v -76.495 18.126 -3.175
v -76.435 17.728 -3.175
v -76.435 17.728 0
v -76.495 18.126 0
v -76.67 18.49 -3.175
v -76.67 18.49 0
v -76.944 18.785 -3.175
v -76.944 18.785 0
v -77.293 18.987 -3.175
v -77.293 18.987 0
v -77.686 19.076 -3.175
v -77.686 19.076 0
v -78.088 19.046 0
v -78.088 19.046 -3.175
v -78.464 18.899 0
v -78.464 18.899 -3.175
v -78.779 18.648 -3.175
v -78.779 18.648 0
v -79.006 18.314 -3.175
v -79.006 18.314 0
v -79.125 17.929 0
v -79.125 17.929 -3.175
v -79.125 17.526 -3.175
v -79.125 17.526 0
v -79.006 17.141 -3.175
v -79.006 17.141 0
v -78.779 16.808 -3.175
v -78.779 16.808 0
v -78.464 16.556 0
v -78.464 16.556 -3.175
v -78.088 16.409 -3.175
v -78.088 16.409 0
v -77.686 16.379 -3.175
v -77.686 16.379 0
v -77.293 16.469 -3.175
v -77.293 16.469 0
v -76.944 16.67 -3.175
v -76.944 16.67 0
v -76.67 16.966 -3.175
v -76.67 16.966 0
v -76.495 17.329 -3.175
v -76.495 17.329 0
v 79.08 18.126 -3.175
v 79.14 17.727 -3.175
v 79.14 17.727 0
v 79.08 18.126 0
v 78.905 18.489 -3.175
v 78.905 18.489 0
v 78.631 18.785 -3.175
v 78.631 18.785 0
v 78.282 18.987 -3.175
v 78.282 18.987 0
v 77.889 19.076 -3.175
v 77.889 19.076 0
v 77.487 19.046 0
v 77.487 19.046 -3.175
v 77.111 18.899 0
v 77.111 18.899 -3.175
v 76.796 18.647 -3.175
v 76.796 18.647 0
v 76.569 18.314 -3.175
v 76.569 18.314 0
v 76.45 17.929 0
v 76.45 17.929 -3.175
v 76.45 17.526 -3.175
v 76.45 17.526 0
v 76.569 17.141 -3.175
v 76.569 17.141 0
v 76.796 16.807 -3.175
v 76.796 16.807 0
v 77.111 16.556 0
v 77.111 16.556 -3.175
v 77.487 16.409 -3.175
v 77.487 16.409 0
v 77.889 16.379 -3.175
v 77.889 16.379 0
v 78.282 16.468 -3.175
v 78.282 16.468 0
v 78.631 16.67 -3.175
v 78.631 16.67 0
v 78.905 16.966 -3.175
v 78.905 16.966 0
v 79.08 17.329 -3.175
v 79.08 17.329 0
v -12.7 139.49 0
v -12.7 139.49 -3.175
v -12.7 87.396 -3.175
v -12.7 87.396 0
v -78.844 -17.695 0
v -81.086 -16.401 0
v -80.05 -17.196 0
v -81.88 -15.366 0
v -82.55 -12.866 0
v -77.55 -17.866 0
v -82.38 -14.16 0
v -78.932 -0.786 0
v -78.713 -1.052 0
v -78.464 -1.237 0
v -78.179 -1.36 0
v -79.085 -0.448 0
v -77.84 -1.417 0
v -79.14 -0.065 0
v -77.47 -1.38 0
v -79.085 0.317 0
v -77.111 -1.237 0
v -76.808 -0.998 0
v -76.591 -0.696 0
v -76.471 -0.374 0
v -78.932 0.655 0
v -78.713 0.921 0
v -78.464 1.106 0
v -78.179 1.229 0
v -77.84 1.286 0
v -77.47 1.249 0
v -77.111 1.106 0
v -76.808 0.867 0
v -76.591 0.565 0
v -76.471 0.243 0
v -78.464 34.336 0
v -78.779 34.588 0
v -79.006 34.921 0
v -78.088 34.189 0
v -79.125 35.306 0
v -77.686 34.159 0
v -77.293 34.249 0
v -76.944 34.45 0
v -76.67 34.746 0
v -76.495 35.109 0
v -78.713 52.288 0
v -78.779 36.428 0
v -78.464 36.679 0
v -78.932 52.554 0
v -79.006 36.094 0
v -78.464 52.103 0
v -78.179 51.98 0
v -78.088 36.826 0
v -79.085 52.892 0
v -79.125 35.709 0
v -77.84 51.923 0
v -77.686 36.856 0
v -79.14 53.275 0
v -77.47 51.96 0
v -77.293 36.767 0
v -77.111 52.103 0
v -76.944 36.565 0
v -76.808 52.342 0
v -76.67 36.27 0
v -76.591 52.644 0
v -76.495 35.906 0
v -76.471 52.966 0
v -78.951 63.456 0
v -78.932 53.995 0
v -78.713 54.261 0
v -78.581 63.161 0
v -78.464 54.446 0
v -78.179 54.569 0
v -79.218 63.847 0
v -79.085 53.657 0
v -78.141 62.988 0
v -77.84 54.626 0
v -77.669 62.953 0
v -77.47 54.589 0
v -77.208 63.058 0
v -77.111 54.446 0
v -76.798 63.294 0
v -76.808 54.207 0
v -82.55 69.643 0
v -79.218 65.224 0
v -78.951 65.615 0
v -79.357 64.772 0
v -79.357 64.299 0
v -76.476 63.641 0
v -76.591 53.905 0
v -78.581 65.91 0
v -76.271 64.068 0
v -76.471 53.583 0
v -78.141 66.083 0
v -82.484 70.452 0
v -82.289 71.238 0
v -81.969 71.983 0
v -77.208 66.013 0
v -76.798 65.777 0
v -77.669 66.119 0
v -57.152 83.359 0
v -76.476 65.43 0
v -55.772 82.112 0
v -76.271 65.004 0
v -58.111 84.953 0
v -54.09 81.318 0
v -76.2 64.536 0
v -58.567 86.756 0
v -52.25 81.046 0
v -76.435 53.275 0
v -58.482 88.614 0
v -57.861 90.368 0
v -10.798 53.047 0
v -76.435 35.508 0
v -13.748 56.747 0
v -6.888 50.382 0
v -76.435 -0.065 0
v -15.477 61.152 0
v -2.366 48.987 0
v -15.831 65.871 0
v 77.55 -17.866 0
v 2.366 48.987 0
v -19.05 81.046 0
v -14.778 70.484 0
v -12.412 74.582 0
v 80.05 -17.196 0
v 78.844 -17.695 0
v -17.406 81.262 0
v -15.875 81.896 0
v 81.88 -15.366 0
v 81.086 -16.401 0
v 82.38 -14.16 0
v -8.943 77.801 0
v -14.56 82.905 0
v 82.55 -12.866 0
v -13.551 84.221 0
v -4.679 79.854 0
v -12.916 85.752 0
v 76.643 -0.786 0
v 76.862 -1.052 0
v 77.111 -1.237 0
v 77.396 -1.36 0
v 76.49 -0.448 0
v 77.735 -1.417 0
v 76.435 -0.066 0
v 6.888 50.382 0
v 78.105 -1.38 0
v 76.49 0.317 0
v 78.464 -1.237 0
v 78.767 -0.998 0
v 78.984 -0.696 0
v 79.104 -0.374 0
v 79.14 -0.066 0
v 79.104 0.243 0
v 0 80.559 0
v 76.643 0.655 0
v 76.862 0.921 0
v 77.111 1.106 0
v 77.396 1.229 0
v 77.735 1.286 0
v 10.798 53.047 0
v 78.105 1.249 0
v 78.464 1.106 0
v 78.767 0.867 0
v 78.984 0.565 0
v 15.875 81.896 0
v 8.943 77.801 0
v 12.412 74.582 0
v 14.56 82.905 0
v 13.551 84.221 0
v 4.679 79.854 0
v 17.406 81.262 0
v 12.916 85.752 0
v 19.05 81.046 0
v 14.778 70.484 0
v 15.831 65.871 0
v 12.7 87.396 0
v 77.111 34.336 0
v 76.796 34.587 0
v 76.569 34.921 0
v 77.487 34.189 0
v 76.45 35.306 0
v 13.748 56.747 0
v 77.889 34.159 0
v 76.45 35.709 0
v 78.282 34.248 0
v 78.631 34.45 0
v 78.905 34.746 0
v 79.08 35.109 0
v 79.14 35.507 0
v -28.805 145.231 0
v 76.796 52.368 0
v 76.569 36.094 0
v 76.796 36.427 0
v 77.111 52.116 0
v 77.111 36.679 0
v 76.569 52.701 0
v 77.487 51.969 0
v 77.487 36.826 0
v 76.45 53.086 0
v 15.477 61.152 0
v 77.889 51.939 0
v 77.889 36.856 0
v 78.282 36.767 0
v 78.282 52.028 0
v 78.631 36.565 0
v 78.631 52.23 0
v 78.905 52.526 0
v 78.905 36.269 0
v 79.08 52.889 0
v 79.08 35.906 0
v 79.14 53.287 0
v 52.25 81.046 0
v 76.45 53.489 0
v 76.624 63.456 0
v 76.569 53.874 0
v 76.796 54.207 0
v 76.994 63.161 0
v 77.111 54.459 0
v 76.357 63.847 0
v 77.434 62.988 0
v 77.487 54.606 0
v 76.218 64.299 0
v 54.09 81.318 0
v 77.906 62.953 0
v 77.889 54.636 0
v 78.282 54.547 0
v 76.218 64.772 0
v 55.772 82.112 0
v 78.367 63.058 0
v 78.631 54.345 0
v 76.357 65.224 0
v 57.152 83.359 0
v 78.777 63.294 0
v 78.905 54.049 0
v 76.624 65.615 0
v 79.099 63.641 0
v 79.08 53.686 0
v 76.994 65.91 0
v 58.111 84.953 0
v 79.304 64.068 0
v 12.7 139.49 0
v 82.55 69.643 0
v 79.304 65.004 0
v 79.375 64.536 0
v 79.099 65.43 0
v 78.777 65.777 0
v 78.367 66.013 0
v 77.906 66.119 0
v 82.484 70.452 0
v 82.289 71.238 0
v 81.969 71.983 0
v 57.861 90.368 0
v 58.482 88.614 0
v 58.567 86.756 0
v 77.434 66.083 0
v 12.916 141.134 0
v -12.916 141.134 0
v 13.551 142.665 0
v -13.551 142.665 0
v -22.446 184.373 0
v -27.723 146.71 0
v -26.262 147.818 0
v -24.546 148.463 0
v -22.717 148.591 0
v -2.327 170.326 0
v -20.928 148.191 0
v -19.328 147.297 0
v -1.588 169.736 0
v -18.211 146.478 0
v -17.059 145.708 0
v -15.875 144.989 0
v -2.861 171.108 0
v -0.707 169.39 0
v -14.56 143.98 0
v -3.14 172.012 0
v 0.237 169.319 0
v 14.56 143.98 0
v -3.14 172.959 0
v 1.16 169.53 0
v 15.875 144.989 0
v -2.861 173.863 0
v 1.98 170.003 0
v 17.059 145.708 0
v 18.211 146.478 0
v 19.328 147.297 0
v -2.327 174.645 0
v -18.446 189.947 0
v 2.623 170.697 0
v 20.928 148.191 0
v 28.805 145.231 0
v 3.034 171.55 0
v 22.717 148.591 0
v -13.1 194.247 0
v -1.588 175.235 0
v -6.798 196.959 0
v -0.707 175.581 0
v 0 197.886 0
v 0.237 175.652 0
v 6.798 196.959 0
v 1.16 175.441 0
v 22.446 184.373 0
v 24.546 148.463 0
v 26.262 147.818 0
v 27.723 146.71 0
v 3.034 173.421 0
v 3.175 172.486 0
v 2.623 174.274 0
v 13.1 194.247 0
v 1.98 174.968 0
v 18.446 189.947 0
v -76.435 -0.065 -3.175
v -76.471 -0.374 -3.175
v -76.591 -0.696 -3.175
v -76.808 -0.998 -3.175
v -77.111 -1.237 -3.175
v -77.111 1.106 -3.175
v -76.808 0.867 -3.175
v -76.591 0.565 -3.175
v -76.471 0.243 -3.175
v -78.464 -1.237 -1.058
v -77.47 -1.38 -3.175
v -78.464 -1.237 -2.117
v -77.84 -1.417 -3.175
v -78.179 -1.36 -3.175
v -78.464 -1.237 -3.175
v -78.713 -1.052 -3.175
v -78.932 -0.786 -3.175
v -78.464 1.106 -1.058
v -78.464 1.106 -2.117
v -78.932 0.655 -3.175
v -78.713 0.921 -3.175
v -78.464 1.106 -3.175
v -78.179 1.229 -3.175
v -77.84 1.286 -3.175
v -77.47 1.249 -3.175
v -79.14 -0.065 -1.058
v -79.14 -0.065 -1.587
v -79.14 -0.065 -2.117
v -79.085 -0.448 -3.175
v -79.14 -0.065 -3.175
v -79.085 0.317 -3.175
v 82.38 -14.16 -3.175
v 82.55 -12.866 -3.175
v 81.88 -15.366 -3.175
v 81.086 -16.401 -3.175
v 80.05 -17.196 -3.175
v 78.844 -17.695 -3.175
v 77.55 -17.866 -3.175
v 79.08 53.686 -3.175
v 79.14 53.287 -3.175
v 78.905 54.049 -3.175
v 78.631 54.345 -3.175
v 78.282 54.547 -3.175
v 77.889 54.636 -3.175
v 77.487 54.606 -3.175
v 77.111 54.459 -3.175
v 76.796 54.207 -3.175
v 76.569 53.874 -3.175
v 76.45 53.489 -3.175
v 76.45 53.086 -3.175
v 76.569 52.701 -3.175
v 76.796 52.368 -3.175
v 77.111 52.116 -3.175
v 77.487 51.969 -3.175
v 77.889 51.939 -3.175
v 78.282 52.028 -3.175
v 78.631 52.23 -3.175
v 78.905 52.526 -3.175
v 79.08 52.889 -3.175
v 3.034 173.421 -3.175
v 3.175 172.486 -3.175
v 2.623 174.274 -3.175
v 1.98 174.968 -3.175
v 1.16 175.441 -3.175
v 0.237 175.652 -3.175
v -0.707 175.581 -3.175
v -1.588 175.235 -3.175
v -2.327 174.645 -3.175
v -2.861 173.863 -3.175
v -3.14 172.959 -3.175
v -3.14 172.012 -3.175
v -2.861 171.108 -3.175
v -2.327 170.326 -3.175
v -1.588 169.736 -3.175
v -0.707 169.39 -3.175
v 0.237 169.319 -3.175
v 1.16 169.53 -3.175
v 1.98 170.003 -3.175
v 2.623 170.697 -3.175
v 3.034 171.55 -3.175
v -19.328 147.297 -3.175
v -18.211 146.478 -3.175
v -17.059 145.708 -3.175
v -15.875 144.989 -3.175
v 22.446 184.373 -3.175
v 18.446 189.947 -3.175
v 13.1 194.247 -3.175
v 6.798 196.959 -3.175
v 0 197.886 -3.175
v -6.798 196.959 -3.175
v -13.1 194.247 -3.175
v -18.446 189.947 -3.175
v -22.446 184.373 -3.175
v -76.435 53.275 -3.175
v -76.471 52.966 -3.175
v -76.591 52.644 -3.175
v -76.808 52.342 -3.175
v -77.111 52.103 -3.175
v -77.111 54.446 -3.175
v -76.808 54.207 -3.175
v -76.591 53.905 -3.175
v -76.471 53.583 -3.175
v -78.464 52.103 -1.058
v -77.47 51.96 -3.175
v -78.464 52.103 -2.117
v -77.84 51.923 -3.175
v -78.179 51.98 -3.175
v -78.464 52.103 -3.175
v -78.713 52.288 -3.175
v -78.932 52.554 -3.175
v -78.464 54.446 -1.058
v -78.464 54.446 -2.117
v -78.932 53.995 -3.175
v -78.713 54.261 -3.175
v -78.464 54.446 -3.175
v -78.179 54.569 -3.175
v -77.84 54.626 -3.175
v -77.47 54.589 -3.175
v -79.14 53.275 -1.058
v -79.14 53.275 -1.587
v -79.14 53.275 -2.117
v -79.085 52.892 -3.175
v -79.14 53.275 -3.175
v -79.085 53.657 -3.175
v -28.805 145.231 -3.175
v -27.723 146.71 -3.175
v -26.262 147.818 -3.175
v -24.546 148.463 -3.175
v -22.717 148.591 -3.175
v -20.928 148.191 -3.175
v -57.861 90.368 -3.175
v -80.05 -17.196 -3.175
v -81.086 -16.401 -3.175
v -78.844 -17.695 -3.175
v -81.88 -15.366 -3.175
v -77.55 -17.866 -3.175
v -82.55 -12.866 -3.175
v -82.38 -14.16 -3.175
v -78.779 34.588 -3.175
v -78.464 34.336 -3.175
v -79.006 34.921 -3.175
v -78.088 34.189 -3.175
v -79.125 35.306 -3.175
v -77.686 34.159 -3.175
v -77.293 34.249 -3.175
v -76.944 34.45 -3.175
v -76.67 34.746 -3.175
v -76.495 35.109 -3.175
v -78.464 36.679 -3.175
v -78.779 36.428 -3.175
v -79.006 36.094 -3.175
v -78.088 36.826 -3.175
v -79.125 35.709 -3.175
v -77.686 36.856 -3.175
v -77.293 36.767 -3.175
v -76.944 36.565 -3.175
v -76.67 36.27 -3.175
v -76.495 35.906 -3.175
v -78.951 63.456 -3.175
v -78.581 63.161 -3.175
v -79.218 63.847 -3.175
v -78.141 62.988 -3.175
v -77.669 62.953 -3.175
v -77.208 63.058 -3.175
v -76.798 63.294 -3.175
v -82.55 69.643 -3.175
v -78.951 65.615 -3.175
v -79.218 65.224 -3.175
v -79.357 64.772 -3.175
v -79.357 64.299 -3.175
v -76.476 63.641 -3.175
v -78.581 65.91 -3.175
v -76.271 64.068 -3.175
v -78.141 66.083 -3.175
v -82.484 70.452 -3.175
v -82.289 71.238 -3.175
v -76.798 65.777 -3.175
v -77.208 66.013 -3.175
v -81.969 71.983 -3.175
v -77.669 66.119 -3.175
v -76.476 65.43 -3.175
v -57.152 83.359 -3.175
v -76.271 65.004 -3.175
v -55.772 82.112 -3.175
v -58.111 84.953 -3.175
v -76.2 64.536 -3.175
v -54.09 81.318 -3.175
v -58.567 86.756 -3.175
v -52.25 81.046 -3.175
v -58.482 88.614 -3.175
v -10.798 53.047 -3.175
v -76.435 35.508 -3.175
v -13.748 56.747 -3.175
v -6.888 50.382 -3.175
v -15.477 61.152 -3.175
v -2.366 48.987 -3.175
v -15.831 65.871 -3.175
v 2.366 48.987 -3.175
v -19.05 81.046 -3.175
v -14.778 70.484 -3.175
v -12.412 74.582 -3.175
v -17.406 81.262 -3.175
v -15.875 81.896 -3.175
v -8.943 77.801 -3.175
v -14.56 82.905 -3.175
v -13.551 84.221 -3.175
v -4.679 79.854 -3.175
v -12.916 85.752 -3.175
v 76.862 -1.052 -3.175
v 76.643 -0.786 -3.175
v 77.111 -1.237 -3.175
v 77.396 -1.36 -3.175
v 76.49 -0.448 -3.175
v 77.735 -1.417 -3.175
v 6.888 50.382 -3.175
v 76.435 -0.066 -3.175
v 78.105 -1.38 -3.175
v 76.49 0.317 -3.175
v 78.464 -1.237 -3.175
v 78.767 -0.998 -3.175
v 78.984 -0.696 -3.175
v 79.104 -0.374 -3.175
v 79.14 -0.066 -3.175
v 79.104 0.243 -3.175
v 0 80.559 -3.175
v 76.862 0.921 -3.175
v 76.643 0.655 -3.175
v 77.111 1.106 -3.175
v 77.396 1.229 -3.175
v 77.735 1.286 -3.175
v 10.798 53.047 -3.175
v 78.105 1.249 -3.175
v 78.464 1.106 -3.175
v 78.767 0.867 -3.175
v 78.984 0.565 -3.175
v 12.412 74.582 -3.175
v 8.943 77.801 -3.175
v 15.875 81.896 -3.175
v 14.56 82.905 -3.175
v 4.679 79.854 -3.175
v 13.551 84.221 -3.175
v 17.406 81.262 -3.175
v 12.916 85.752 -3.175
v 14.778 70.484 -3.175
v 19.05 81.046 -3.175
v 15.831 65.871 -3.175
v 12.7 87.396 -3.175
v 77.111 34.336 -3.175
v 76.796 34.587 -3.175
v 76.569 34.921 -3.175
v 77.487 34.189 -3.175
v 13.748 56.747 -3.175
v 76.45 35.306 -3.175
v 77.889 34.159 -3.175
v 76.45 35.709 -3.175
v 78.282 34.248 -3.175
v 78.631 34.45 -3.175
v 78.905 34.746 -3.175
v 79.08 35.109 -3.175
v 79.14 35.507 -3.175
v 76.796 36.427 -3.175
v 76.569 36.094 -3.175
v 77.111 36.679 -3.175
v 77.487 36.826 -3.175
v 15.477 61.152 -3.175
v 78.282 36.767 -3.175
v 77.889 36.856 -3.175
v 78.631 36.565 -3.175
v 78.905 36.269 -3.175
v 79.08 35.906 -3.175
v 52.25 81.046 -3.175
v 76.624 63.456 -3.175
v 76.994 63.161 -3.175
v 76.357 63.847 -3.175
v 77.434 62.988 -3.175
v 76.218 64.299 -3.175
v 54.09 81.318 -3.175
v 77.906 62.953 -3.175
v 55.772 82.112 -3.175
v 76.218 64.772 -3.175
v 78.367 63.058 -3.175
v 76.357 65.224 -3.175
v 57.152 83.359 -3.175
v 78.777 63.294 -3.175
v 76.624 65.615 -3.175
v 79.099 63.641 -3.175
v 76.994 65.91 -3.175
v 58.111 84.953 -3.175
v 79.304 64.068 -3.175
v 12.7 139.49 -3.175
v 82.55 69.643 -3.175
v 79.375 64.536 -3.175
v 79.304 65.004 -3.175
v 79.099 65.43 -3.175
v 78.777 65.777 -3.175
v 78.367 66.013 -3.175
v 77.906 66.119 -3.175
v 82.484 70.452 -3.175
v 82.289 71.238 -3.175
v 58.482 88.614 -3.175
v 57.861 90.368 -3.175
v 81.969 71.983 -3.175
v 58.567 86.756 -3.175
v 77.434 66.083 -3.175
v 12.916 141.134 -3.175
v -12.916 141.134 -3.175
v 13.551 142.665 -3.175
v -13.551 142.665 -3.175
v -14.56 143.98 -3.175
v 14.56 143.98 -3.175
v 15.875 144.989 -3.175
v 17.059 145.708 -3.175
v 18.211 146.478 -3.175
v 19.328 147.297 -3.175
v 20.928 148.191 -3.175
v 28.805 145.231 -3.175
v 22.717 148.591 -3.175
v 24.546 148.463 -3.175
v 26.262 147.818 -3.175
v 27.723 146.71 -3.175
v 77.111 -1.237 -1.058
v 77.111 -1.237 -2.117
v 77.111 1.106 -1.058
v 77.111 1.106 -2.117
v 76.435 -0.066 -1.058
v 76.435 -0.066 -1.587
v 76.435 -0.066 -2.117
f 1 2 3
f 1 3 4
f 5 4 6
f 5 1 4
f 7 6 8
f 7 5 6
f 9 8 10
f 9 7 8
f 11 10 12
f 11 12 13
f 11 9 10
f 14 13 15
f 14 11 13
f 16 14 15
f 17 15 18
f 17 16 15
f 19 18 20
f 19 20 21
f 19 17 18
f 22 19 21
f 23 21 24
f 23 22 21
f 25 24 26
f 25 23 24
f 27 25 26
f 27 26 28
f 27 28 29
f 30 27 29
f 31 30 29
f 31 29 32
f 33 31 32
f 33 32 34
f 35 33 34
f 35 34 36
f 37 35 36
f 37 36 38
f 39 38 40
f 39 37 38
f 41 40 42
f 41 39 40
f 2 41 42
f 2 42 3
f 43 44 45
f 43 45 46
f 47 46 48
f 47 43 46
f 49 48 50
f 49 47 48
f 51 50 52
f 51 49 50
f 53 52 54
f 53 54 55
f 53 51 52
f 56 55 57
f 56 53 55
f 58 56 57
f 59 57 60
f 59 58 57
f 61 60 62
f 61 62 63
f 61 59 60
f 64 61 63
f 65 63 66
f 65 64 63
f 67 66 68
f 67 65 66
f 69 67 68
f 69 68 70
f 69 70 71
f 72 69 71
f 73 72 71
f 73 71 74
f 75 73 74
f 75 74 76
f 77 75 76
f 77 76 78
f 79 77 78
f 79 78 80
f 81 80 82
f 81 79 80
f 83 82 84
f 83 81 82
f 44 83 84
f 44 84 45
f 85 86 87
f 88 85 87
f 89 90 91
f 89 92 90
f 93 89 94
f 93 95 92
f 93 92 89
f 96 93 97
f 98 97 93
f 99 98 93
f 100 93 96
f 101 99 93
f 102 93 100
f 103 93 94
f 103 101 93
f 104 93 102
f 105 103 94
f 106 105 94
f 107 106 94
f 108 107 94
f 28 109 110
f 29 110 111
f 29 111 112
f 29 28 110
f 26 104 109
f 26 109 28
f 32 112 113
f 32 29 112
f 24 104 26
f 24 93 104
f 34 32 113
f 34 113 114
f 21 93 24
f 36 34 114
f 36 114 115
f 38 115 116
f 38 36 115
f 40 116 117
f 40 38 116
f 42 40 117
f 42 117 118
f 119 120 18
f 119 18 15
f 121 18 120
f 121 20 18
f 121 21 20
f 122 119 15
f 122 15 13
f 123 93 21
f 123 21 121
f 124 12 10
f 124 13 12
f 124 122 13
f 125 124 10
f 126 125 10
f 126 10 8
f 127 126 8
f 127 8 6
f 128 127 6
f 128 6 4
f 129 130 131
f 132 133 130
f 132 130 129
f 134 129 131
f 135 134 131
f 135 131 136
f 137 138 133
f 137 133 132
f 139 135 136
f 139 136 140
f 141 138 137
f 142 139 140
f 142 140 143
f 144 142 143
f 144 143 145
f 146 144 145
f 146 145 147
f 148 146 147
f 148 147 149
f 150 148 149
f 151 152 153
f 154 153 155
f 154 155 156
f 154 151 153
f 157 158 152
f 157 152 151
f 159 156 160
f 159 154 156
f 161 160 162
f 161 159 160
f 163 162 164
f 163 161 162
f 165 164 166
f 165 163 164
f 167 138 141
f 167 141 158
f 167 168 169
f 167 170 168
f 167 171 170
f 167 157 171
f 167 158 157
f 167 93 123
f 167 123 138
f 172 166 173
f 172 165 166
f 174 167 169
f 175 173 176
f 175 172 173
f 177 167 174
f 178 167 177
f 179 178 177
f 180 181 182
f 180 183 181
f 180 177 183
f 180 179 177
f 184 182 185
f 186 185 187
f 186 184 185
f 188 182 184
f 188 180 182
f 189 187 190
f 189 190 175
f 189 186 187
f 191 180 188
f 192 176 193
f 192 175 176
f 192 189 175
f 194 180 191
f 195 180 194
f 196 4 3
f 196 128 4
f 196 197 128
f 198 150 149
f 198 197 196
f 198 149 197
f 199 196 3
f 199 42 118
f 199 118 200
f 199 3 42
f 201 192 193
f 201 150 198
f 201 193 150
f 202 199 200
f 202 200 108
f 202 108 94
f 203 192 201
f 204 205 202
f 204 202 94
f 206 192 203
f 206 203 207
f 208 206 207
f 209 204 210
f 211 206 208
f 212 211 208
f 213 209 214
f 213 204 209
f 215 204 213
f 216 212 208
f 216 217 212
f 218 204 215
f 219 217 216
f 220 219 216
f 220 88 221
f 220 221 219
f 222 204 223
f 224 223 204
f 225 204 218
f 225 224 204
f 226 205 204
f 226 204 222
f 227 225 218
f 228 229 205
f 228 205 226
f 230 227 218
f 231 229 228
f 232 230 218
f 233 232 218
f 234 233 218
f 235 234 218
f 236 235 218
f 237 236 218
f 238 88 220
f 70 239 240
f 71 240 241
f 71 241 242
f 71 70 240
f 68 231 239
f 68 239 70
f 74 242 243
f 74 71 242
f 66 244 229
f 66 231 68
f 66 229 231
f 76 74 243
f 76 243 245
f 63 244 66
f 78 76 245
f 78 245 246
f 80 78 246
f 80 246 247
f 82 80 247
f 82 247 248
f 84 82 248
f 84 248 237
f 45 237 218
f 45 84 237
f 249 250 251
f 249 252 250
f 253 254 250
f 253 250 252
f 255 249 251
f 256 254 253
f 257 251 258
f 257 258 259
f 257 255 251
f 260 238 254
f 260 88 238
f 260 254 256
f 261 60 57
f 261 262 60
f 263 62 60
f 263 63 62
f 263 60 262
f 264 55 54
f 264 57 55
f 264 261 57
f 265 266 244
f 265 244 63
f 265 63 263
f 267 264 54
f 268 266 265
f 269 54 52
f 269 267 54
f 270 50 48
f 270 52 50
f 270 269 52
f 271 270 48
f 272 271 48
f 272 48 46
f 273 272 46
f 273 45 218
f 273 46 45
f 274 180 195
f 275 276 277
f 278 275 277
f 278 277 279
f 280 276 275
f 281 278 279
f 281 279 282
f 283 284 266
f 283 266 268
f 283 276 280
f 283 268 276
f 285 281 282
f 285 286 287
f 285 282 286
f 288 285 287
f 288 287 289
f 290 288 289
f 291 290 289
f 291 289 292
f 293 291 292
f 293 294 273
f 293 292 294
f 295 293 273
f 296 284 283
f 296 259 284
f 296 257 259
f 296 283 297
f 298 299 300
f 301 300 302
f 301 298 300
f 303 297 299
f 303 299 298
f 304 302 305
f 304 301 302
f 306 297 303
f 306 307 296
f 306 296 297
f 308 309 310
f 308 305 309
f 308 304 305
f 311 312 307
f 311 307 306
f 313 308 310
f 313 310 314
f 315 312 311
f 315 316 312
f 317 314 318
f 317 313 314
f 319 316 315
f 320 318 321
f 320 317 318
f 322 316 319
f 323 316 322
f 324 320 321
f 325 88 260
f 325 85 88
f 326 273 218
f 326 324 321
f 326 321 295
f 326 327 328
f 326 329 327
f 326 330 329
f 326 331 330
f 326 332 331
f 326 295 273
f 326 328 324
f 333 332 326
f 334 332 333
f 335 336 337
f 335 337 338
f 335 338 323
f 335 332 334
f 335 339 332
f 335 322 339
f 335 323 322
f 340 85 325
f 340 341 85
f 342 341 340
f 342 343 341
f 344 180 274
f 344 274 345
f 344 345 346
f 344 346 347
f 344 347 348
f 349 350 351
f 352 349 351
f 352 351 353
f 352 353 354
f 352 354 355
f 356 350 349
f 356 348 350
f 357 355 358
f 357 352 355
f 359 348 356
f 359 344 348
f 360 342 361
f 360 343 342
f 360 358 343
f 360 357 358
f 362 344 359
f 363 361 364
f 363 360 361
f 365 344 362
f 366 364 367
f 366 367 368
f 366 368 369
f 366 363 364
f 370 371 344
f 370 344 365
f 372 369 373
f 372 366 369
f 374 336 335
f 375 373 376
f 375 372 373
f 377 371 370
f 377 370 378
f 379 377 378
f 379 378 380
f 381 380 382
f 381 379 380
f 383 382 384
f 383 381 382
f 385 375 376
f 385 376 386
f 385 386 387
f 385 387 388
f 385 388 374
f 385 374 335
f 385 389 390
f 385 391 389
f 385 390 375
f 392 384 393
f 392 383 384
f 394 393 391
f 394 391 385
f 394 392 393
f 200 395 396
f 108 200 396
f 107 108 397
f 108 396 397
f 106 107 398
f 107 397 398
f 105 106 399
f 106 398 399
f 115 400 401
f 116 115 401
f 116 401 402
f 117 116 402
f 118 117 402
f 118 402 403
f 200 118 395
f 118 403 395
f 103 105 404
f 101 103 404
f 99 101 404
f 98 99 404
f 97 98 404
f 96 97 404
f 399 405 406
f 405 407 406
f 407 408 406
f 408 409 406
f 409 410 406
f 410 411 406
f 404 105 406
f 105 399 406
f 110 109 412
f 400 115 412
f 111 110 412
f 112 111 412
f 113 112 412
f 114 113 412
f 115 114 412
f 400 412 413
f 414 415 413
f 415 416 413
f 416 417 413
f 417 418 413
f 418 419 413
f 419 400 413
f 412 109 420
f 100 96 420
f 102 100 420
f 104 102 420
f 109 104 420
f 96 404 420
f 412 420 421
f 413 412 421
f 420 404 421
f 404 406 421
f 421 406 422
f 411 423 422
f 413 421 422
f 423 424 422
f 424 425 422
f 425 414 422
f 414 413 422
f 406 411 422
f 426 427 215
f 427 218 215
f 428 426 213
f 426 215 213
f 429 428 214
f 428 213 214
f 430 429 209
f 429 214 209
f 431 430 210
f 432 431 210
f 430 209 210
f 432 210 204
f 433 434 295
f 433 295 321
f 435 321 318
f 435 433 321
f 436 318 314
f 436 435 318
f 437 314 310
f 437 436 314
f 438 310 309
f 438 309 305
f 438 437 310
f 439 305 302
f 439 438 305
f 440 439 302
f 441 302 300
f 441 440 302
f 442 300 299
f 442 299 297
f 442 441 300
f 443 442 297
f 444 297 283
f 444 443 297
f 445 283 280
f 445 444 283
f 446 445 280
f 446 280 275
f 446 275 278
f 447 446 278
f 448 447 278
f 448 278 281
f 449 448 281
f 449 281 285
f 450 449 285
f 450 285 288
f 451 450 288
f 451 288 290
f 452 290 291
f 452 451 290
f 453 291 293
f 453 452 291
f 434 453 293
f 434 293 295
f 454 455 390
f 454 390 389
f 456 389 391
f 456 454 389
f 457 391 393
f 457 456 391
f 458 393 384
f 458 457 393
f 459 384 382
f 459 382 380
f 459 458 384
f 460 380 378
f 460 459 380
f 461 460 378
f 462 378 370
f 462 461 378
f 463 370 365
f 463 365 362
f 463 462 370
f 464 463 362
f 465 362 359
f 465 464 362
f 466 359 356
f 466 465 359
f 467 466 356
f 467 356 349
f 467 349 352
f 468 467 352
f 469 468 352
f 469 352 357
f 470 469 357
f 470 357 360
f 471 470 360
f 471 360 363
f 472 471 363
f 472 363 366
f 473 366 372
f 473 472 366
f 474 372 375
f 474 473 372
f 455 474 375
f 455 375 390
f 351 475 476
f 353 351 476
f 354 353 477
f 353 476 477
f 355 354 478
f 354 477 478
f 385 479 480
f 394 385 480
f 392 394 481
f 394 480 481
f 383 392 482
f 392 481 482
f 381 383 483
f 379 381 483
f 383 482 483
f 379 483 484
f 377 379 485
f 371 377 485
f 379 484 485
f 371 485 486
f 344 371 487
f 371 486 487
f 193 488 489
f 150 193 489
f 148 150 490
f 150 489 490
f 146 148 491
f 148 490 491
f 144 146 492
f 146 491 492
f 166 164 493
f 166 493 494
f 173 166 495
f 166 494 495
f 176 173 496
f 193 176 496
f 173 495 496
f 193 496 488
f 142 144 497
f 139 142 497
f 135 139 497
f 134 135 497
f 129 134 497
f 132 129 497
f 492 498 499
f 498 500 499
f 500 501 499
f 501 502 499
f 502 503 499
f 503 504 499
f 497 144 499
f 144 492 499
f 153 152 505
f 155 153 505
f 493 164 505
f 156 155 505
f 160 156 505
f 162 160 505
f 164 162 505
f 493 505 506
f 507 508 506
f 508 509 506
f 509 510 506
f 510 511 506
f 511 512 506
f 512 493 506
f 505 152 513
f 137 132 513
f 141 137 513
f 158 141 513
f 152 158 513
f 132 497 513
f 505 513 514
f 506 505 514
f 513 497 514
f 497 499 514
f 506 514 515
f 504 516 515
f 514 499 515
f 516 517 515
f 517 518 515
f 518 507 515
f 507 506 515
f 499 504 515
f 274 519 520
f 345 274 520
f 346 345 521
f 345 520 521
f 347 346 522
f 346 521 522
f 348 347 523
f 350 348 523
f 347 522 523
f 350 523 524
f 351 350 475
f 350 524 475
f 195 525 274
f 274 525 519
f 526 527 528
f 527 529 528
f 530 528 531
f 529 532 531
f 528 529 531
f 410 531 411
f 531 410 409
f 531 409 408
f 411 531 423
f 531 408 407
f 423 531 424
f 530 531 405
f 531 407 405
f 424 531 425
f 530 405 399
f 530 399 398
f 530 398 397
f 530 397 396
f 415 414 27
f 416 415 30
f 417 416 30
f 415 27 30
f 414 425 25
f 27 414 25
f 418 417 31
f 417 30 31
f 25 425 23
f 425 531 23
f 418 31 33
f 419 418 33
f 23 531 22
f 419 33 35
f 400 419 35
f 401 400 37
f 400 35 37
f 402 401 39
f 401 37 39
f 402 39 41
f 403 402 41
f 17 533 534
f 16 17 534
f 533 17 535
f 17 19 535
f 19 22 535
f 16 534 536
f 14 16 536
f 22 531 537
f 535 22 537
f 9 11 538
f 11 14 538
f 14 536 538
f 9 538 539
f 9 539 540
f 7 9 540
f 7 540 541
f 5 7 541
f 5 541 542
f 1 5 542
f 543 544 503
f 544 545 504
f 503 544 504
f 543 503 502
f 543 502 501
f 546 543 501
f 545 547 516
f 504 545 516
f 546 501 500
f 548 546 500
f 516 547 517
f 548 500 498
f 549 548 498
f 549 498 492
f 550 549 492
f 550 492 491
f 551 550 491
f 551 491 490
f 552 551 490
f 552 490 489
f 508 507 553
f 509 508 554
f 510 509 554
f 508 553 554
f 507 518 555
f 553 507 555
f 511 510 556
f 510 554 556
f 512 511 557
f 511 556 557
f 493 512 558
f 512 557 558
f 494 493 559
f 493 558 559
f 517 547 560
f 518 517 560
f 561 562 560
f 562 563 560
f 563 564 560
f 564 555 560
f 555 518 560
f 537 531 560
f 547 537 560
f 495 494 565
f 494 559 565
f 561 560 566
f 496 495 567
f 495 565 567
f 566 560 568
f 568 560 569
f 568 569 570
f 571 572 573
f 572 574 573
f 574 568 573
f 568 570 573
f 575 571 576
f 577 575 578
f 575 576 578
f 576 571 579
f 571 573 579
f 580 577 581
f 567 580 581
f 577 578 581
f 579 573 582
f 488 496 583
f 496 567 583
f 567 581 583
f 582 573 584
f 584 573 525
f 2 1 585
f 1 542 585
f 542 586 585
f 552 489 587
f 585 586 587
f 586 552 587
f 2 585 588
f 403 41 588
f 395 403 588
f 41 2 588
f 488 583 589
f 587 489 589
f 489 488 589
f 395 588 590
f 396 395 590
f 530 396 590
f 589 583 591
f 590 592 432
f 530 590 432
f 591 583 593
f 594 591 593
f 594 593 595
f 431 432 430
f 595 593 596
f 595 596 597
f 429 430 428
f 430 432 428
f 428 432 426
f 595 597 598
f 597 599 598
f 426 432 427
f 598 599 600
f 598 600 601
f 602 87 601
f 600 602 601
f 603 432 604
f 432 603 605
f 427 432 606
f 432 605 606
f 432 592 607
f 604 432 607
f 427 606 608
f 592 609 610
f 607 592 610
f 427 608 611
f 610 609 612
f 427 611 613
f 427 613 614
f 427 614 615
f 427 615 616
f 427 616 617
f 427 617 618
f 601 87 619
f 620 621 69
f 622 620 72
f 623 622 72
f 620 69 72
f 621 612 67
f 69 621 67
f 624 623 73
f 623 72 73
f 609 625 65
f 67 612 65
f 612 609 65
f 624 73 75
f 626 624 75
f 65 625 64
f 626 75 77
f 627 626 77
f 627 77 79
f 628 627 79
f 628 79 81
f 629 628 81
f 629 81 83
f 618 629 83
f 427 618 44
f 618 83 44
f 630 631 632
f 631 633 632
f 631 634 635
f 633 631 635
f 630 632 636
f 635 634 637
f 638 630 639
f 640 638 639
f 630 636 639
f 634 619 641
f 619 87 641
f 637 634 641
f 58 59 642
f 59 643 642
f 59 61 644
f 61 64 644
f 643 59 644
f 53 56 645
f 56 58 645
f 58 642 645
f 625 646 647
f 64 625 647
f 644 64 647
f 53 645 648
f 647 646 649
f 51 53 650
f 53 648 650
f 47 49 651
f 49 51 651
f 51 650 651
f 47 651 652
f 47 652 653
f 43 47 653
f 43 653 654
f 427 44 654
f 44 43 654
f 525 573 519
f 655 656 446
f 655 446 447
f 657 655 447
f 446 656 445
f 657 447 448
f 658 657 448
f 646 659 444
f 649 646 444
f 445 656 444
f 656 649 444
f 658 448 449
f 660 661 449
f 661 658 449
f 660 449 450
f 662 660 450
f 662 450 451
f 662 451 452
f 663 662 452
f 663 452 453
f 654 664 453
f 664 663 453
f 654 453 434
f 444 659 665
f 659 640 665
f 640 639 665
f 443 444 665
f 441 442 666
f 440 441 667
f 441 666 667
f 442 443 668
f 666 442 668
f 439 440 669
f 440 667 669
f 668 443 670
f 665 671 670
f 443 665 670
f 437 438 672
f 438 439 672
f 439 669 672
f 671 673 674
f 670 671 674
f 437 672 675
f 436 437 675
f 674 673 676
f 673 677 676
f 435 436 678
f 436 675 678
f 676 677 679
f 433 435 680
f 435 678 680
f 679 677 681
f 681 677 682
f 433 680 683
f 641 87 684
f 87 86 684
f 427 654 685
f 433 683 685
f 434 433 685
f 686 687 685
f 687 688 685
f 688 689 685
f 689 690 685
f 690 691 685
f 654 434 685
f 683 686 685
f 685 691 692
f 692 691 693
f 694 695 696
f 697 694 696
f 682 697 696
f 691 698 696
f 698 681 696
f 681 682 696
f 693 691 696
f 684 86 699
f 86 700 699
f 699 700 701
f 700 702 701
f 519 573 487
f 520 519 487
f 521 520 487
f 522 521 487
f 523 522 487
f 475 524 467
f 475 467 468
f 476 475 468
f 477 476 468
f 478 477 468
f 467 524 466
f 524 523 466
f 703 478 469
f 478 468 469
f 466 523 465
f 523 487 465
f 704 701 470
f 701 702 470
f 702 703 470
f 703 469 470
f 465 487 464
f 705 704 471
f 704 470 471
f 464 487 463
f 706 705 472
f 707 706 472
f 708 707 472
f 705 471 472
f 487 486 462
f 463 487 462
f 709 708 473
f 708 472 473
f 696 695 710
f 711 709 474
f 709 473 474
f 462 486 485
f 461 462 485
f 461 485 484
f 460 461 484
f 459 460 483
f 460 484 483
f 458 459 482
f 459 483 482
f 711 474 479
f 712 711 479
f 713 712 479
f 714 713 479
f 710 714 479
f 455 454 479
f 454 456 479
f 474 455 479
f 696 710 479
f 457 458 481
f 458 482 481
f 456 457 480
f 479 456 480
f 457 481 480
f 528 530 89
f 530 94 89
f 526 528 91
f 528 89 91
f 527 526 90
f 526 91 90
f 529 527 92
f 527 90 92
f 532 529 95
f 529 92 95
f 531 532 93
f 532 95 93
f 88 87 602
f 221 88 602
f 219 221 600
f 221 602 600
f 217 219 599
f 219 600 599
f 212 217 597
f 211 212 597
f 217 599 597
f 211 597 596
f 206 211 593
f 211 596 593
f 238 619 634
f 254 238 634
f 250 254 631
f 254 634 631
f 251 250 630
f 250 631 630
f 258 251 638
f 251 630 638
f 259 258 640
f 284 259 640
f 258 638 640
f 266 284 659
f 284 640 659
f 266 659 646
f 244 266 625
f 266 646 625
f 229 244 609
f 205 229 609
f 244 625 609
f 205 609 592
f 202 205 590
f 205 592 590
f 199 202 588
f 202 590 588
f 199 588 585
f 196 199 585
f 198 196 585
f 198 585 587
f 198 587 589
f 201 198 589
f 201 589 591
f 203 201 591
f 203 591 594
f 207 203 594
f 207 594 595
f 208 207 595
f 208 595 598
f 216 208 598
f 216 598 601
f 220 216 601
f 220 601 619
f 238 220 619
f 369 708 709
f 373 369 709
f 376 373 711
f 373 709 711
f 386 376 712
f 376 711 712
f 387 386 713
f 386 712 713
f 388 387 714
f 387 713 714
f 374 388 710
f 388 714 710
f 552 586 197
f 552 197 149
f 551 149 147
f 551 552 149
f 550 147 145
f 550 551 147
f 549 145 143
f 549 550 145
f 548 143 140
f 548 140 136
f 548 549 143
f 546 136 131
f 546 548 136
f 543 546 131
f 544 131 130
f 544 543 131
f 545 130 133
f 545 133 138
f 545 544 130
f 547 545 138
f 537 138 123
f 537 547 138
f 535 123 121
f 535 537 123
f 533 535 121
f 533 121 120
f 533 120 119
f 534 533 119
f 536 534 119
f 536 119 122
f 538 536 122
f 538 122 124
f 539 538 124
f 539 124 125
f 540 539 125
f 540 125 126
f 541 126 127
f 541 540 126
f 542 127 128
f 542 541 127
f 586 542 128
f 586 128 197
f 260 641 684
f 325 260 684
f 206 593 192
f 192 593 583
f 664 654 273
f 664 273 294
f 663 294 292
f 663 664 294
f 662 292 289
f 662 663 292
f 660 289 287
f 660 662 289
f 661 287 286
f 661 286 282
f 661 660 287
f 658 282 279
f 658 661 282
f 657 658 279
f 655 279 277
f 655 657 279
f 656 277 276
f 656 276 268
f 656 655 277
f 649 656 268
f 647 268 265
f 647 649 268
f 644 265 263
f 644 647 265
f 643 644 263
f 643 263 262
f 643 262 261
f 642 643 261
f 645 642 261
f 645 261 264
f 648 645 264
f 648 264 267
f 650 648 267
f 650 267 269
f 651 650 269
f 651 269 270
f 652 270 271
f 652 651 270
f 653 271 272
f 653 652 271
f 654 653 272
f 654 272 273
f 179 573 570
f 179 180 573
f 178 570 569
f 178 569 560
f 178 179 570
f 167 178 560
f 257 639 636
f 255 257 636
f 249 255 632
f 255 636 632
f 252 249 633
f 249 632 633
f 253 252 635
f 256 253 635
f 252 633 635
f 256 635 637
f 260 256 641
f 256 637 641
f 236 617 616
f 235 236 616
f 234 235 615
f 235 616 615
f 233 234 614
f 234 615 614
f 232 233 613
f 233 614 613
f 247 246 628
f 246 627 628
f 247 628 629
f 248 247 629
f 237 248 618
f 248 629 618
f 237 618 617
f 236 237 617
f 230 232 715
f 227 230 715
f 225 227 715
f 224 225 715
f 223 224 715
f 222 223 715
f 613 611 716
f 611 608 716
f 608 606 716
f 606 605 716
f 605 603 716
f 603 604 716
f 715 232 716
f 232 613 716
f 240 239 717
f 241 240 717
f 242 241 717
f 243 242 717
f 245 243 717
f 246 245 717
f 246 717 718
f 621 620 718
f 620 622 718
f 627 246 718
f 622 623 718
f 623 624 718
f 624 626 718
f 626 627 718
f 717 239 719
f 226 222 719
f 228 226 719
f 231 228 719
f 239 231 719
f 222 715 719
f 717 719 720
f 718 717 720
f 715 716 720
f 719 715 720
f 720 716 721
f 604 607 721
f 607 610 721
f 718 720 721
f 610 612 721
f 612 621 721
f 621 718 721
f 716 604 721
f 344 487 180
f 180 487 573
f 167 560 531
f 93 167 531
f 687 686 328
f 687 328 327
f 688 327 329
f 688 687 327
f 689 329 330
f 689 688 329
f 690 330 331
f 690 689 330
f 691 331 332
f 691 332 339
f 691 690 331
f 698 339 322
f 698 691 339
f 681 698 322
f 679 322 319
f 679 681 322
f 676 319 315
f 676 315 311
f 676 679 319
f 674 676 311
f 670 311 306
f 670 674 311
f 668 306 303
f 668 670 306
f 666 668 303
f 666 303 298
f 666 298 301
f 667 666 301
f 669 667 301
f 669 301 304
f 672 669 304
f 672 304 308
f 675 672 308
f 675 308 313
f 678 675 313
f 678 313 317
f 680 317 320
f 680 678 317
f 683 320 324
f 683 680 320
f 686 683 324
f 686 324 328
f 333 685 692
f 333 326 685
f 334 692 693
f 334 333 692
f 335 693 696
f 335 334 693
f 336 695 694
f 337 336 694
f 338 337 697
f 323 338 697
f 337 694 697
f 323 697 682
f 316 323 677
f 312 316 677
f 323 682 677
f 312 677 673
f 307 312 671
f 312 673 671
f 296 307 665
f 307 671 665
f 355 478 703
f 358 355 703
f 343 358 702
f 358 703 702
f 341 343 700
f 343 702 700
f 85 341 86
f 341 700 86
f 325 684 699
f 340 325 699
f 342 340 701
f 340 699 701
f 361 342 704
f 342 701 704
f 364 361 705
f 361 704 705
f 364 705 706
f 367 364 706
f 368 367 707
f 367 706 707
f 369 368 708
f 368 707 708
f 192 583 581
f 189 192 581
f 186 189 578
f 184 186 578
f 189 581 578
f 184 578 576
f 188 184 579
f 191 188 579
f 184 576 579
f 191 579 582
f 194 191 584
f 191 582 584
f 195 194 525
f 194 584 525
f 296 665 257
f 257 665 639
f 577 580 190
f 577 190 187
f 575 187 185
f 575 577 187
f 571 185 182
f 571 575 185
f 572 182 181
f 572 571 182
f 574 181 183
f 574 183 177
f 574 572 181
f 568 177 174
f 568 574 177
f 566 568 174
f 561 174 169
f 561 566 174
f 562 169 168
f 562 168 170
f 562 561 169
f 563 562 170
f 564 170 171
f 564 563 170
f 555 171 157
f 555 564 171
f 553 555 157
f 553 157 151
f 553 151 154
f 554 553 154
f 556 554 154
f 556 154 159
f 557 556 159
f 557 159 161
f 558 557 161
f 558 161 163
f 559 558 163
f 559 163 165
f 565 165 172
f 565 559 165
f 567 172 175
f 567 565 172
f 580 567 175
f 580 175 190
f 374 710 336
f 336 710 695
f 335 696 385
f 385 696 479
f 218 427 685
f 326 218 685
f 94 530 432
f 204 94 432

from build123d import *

# Parameters (mm, degrees)
AM_1014_TI_PLATE_BOTTOM_1_AM_0001_ARTEME_START = -3.175
AM_1014_TI_PLATE_BOTTOM_1_AM_0001_AR_2_R       = 1.352550752
AM_1014_TI_PLATE_BOTTOM_1_AM_0001_AR_2_R_2     = 1.5875
AM_1014_TI_PLATE_BOTTOM_1_AM_0001_AR_2_R_3     = 3.175
AM_1014_TI_PLATE_BOTTOM_1_AM_0001_ARTEME_DEPTH = 3.175
BOSS_EXTRUDE1_DEPTH                            = 3.175
FILLET1_R                                      = 5
FILLET2_R                                      = 5
SKETCH3_R                                      = 15.875
CUT_EXTRUDE1_DEPTH                             = 215.437164916


# Read off the part's stored shape, not the designer's step: AM_1014_TI_PLATE_BOTTOM<1>@AM_0001_ARTEMECH
with BuildPart() as part:
    # AM_1014_TI_PLATE_BOTTOM_1_AM_0001_AR 2 → AM_1014_TI_PLATE_BOTTOM<1>@AM_0001_ARTEMECH (new body)
    with BuildSketch(Plane.XY.offset(AM_1014_TI_PLATE_BOTTOM_1_AM_0001_ARTEME_START)):
        with BuildLine():
            Line((82.55, -17.865698052), (82.55, 70.885609673))
            Line((82.55, 70.885609673), (22.446426721, 184.373331383))
            ThreePointArc((22.446426721, 184.373331383), (0, 197.885609673), (-22.446426721, 184.373331383))
            Line((-22.446426721, 184.373331383), (-82.55, 70.885609673))
            Line((-82.55, 70.885609673), (-82.55, -17.865526365))
            Line((-82.55, -17.865526365), (82.55, -17.865698052))
        make_face()
        with BuildLine():
            add(Edge.make_bspline(
                [(-76.43495, -0.065424583), (-76.43495, -2.408108601), (-78.463775, -1.236766592), (-80.4926, -0.065424583), (-78.463775, 1.105917426), (-76.43495, 2.277259435), (-76.43495, -0.065424583)],
                knots=[0, 0, 0, 2.094395102, 2.094395102, 4.188790205, 4.188790205, 6.283185307, 6.283185307, 6.283185307], degree=2, weights=[1, 0.5, 1, 0.5, 1, 0.5, 1]))
        make_face(mode=Mode.SUBTRACT)
        with Locations((-77.7875, 17.727628115)):
            Circle(AM_1014_TI_PLATE_BOTTOM_1_AM_0001_AR_2_R, mode=Mode.SUBTRACT)
        with Locations((-77.7875, 35.507637995)):
            Circle(AM_1014_TI_PLATE_BOTTOM_1_AM_0001_AR_2_R, mode=Mode.SUBTRACT)
        with BuildLine():
            add(Edge.make_bspline(
                [(-76.43495, 53.274545779), (-76.43495, 50.931861761), (-78.463775, 52.10320377), (-80.4926, 53.274545779), (-78.463775, 54.445887788), (-76.43495, 55.617229797), (-76.43495, 53.274545779)],
                knots=[0, 0, 0, 2.094395102, 2.094395102, 4.188790205, 4.188790205, 6.283185307, 6.283185307, 6.283185307], degree=2, weights=[1, 0.5, 1, 0.5, 1, 0.5, 1]))
        make_face(mode=Mode.SUBTRACT)
        with Locations((-77.7875, 64.535609673)):
            Circle(AM_1014_TI_PLATE_BOTTOM_1_AM_0001_AR_2_R_2, mode=Mode.SUBTRACT)
        with BuildLine():
            Line((-25.498963051, 42.455971326), (-25.498963051, 51.980966033))
            add(Edge.make_bspline(
                [(-27.992064204, 57.025448466), (-25.498963051, 55.119281003), (-25.498963051, 51.980966033)],
                knots=[5.365154464, 5.365154464, 5.365154464, 6.283185307, 6.283185307, 6.283185307], degree=2, weights=[1, 0.896489165, 1]))
            ThreePointArc((-27.992064204, 57.025448466), (-26.013795844, 54.758623994), (-25.301036949, 51.835609673))
            Line((-25.301036949, 51.835609673), (-25.301036949, 42.310609673))
            ThreePointArc((-25.301036949, 42.310609673), (-24.985888452, 40.931525054), (-24.103005841, 39.826214575))
            add(Edge.make_bspline(
                [(-25.498963051, 42.455971326), (-25.49896305, 40.770584495), (-24.103005841, 39.826214575)],
                knots=[0, 0, 0, 0.976013915, 0.976013915, 0.976013915], degree=2, weights=[1, 0.883269083, 1]))
        make_face(mode=Mode.SUBTRACT)
        with Locations((-21.166666667, 47.762966307)):
            Circle(AM_1014_TI_PLATE_BOTTOM_1_AM_0001_AR_2_R_2, mode=Mode.SUBTRACT)
        with BuildLine():
            ThreePointArc((-11.2, 77.174125728), (-9.5, 78.874125728), (-7.8, 77.174125728))
            Line((-7.8, 77.174125728), (-7.8, 64.474125728))
            ThreePointArc((-7.8, 64.474125728), (-9.5, 62.774125728), (-11.2, 64.474125728))
            Line((-11.2, 64.474125728), (-11.2, 77.174125728))
        make_face(mode=Mode.SUBTRACT)
        with BuildLine():
            ThreePointArc((-1.7, 85.174125728), (0, 86.874125728), (1.7, 85.174125728))
            Line((1.7, 85.174125728), (1.7, 56.474125728))
            ThreePointArc((1.7, 56.474125728), (0, 54.774125728), (-1.7, 56.474125728))
            Line((-1.7, 56.474125728), (-1.7, 85.174125728))
        make_face(mode=Mode.SUBTRACT)
        with BuildLine():
            add(Edge.make_bspline(
                [(79.14005, -0.065596271), (79.14005, -2.408280289), (77.111225, -1.23693828), (75.0824, -0.065596271), (77.111225, 1.105745738), (79.14005, 2.277087747), (79.14005, -0.065596271)],
                knots=[0, 0, 0, 2.094395102, 2.094395102, 4.188790205, 4.188790205, 6.283185307, 6.283185307, 6.283185307], degree=2, weights=[1, 0.5, 1, 0.5, 1, 0.5, 1]))
        make_face(mode=Mode.SUBTRACT)
        with Locations((77.7875, 17.727456427)):
            Circle(AM_1014_TI_PLATE_BOTTOM_1_AM_0001_AR_2_R, mode=Mode.SUBTRACT)
        with Locations((77.7875, 35.507466307)):
            Circle(AM_1014_TI_PLATE_BOTTOM_1_AM_0001_AR_2_R, mode=Mode.SUBTRACT)
        with Locations((21.166666667, 47.762966307)):
            Circle(AM_1014_TI_PLATE_BOTTOM_1_AM_0001_AR_2_R_2, mode=Mode.SUBTRACT)
        with BuildLine():
            ThreePointArc((7.8, 77.174125728), (9.5, 78.874125728), (11.2, 77.174125728))
            Line((11.2, 77.174125728), (11.2, 64.474125728))
            ThreePointArc((11.2, 64.474125728), (9.5, 62.774125728), (7.8, 64.474125728))
            Line((7.8, 64.474125728), (7.8, 77.174125728))
        make_face(mode=Mode.SUBTRACT)
        with Locations((77.7875, 53.287476186)):
            Circle(AM_1014_TI_PLATE_BOTTOM_1_AM_0001_AR_2_R, mode=Mode.SUBTRACT)
        with Locations((77.7875, 64.535609673)):
            Circle(AM_1014_TI_PLATE_BOTTOM_1_AM_0001_AR_2_R_2, mode=Mode.SUBTRACT)
        with BuildLine():
            ThreePointArc((-28.80539088, 145.230757697), (-24.546211379, 148.463135508), (-19.3281535, 147.296624336))
            ThreePointArc((-19.3281535, 147.296624336), (-17.639343437, 146.086441824), (-15.875, 144.989303103))
            ThreePointArc((-15.875, 144.989303103), (-13.550738686, 142.665041789), (-12.7, 139.490041789))
            Line((-12.7, 139.490041789), (-12.7, 87.395609673))
            ThreePointArc((-12.7, 87.395609673), (-14.559871939, 82.905481612), (-19.05, 81.045609673))
            Line((-19.05, 81.045609673), (-52.249574284, 81.045609673))
            ThreePointArc((-52.249574284, 81.045609673), (-57.689898641, 84.120648468), (-57.861180964, 90.3675401))
            Line((-57.861180964, 90.3675401), (-28.80539088, 145.230757697))
        make_face(mode=Mode.SUBTRACT)
        with Locations((0, 172.485609673)):
            Circle(AM_1014_TI_PLATE_BOTTOM_1_AM_0001_AR_2_R_3, mode=Mode.SUBTRACT)
        with BuildLine():
            ThreePointArc((12.7, 139.490041789), (13.550738686, 142.665041789), (15.875, 144.989303103))
            ThreePointArc((15.875, 144.989303103), (17.639343437, 146.086441824), (19.3281535, 147.296624336))
            ThreePointArc((19.3281535, 147.296624336), (24.546211379, 148.463135508), (28.80539088, 145.230757697))
            Line((28.80539088, 145.230757697), (57.861180964, 90.3675401))
            ThreePointArc((57.861180964, 90.3675401), (57.689898641, 84.120648468), (52.249574284, 81.045609673))
            Line((52.249574284, 81.045609673), (19.05, 81.045609673))
            ThreePointArc((19.05, 81.045609673), (14.559871939, 82.905481612), (12.7, 87.395609673))
            Line((12.7, 87.395609673), (12.7, 139.490041789))
        make_face(mode=Mode.SUBTRACT)
    extrude(amount=AM_1014_TI_PLATE_BOTTOM_1_AM_0001_ARTEME_DEPTH)

    # Sketch2 → Boss-Extrude1 (add)
    with BuildSketch(Plane.XY):
        Polygon((-32.469776479, 59.073916865), (-26.167336903, 34.866819401), (-21.798600378, 37.659946031), (-22.638250573, 40.884966099), (-23.982968641, 44.105622871), (-23.310609607, 52.84309592), (-24.42605214, 57.127409286), (-28.115838313, 59.292776758), align=None)
        Polygon((-6.053335336, 87.881784973), (-14.736690513, 77.155287401), (-14.736690513, 57.127409286), (-2.605532544, 48.423597474), (16.810044844, 51.617454016), (16.810044844, 65.151825831), (13.228821015, 78.943036996), (9.014839826, 83.667803784), (0, 90.965531262), align=None)
        Polygon((-21.42787696, 50.494433374), (-22.918845174, 48.423597474), (-22.918845174, 45.648786681), (-20.375616181, 43.817703114), (14.824315675, 42.266139704), (26.595333202, 42.266139704), (26.595333202, 48.423597474), (23.719107345, 50.494433374), (18.474028772, 49.64052578), (-6.053335336, 47.698917024), align=None)
    extrude(amount=-BOSS_EXTRUDE1_DEPTH)

    # Fillet1
    fillet1_edges = [part.edges().sort_by_distance(p)[0] for p in [
        (-82.55, -17.865526365, -1.5875),
        (82.55, -17.865698052, -1.5875),
    ]]
    fillet(fillet1_edges, radius=FILLET1_R)

    # Fillet2
    fillet2_edges = [part.edges().sort_by_distance(p)[0] for p in [
        (82.55, 70.885609673, -1.5875),
        (-82.55, 70.885609673, -1.5875),
    ]]
    fillet(fillet2_edges, radius=FILLET2_R)

    # Sketch3 → Cut-Extrude1 (cut, through all)
    with BuildSketch(Plane(origin=(0, 0, -3.175), x_dir=(-1, 0, 0), z_dir=(0, 0, -1))):
        with Locations(Location((6.469e-06, 64.684387792, 0), (0, 0, 90))):
            Circle(SKETCH3_R)
    extrude(amount=-CUT_EXTRUDE1_DEPTH, mode=Mode.SUBTRACT)


solid = part.part
